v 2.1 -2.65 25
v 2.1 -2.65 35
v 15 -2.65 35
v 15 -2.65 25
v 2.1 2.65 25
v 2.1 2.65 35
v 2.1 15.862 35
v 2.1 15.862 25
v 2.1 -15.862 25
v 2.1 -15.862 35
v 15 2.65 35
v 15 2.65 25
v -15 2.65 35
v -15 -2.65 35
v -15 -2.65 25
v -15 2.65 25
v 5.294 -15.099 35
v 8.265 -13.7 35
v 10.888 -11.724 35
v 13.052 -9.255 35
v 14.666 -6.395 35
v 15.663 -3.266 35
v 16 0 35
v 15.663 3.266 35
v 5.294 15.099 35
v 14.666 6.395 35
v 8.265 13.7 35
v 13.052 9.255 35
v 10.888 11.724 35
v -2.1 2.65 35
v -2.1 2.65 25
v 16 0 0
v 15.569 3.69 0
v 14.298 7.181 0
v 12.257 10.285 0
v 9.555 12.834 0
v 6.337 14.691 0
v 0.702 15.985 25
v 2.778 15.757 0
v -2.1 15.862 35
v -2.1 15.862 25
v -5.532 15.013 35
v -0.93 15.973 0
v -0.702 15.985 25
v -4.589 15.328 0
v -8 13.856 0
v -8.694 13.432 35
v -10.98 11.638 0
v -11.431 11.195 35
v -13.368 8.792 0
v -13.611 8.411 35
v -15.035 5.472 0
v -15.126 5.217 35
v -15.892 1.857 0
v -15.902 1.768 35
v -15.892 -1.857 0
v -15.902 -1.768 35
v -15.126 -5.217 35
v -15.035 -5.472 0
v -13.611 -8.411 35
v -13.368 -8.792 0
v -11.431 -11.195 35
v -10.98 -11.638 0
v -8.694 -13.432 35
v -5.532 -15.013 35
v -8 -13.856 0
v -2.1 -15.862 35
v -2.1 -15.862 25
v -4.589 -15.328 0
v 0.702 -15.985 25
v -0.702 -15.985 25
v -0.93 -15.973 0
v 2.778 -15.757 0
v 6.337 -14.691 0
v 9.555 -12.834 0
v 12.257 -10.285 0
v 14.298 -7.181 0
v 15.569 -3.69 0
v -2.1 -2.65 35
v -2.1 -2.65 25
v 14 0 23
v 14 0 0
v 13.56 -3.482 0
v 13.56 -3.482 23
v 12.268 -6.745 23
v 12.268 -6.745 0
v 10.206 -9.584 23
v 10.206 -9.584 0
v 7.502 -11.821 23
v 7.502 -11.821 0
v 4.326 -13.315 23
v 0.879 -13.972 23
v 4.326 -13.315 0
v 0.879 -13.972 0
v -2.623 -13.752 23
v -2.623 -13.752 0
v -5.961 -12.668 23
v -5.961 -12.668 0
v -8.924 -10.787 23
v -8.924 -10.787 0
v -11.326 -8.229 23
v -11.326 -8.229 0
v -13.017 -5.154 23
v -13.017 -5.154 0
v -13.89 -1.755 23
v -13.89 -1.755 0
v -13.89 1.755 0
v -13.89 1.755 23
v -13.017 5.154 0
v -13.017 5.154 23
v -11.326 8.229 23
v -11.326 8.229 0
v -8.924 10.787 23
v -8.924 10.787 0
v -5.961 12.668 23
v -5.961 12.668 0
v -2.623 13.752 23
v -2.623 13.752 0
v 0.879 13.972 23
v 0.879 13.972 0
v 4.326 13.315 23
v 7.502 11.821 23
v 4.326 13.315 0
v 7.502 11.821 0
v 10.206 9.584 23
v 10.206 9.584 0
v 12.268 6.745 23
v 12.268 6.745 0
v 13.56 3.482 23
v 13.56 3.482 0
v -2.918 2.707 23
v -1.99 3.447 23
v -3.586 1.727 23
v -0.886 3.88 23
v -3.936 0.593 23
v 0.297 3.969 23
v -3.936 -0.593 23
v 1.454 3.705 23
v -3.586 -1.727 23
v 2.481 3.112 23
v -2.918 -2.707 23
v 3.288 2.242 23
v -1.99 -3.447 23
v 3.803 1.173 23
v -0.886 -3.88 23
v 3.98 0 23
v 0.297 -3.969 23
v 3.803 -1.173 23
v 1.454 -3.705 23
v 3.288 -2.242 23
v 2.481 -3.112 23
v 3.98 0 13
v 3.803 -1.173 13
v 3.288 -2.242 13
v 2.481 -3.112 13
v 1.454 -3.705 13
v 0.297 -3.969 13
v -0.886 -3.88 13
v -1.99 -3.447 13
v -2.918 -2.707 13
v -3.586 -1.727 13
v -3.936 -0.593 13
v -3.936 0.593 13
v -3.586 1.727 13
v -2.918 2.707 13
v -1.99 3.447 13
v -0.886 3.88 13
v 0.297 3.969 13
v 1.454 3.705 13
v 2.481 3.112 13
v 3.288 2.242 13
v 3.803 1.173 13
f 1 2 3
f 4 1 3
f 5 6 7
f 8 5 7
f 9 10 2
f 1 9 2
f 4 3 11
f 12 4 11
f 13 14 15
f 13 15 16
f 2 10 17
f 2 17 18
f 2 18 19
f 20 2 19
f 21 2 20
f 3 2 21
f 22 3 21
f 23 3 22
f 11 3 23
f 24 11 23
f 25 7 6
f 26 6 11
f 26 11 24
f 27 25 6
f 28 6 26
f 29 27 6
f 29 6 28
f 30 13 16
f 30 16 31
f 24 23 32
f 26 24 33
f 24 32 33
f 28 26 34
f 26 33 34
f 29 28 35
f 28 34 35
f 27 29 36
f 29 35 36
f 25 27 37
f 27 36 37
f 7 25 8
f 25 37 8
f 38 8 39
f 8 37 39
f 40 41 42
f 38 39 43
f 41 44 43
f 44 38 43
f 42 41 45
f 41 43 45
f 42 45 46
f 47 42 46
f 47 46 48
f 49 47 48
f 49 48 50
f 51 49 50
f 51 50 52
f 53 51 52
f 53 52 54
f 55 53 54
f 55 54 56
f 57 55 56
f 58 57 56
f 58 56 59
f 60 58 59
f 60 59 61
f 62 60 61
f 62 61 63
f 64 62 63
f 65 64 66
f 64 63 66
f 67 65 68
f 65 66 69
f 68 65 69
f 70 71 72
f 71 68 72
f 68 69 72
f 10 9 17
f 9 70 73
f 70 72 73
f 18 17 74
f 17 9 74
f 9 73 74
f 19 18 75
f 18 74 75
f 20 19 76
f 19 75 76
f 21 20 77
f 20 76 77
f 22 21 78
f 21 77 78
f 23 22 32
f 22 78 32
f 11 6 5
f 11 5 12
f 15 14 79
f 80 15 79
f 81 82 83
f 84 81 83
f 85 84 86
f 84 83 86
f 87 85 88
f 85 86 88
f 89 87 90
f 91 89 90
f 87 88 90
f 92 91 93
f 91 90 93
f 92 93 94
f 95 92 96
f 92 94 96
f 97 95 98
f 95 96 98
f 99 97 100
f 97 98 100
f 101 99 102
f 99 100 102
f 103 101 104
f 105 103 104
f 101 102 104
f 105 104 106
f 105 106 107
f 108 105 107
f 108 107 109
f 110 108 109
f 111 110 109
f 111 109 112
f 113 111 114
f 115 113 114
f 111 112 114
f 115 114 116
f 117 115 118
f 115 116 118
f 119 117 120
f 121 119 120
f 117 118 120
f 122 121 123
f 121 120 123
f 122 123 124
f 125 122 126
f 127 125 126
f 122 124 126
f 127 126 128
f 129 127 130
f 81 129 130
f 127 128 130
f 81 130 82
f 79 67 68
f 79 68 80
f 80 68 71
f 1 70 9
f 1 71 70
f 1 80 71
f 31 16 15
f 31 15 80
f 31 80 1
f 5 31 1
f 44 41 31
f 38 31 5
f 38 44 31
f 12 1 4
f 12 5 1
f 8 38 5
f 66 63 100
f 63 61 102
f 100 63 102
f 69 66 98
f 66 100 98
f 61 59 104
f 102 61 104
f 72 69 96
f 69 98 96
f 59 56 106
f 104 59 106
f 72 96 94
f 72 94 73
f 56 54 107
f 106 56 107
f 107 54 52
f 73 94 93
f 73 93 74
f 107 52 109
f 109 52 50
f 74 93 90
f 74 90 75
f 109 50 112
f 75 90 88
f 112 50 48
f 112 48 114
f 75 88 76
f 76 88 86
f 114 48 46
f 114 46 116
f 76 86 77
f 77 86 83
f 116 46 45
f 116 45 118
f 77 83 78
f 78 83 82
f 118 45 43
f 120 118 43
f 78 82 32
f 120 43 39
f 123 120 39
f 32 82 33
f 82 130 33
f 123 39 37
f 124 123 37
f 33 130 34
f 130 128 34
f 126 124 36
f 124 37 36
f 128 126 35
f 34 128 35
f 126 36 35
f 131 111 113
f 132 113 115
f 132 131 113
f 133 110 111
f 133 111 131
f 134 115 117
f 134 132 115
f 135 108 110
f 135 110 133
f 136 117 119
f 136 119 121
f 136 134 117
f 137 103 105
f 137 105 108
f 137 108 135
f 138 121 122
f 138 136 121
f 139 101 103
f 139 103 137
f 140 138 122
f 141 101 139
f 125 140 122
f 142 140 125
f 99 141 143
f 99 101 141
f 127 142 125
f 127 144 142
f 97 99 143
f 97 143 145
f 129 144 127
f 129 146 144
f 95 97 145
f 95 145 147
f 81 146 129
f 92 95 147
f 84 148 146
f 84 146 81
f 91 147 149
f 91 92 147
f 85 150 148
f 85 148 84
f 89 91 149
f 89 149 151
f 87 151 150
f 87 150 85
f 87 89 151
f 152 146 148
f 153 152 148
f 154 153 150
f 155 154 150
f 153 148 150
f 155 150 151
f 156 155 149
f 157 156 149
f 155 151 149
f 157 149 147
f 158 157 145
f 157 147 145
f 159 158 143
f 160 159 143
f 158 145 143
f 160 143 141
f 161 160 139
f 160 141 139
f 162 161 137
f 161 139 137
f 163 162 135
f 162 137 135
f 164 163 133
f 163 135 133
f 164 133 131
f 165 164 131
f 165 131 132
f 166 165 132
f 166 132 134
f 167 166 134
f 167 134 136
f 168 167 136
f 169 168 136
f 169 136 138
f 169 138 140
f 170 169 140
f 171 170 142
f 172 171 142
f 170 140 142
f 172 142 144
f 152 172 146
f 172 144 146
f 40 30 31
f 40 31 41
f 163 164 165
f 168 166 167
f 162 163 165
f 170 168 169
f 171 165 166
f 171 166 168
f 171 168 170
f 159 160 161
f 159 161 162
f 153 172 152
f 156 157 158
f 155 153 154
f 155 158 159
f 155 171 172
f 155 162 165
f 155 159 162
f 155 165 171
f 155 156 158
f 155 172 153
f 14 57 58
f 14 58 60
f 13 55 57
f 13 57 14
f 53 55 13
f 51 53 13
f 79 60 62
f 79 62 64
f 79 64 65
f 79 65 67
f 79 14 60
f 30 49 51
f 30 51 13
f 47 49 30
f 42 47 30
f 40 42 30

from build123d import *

# Parameters (mm, degrees)
SKETCH_R        = 16
PAD_DEPTH       = 35
SKETCH001_R     = 14
POCKET_DEPTH    = 23
SKETCH002_R     = 3.98
PAD001_DEPTH    = 10
SKETCH003_W     = 30
SKETCH003_H     = 5.3
POCKET001_DEPTH = 10
SKETCH004_W     = 4.2
SKETCH004_H     = 32.681076
POCKET002_DEPTH = 10


with BuildPart() as part:
    # Sketch → Pad (new body)
    with BuildSketch(Plane.XY):
        Circle(SKETCH_R)
    extrude(amount=PAD_DEPTH)

    # Sketch001 (on Face2 of Pad) → Pocket (cut)
    with BuildSketch(Plane(origin=(0, 0, 0), x_dir=(1, 0, 0), z_dir=(0, 0, -1))):
        Circle(SKETCH001_R)
    extrude(amount=-POCKET_DEPTH, mode=Mode.SUBTRACT)

    # Sketch002 (on Face5 of Pocket) → Pad001 (join)
    with BuildSketch(Plane(origin=(0, 0, 23), x_dir=(1, 0, 0), z_dir=(0, 0, -1))):
        Circle(SKETCH002_R)
    extrude(amount=PAD001_DEPTH)

    # Sketch003 (on Face3 of Pad001) → Pocket001 (cut)
    with BuildSketch(Plane.XY.offset(35)):
        Rectangle(SKETCH003_W, SKETCH003_H)
    extrude(amount=-POCKET001_DEPTH, mode=Mode.SUBTRACT)

    # Sketch004 (on Face3 of Pocket001) → Pocket002 (cut)
    with BuildSketch(Plane.XY.offset(35)):
        with Locations((0, -0.015375)):
            Rectangle(SKETCH004_W, SKETCH004_H)
    extrude(amount=-POCKET002_DEPTH, mode=Mode.SUBTRACT)


solid = part.part
